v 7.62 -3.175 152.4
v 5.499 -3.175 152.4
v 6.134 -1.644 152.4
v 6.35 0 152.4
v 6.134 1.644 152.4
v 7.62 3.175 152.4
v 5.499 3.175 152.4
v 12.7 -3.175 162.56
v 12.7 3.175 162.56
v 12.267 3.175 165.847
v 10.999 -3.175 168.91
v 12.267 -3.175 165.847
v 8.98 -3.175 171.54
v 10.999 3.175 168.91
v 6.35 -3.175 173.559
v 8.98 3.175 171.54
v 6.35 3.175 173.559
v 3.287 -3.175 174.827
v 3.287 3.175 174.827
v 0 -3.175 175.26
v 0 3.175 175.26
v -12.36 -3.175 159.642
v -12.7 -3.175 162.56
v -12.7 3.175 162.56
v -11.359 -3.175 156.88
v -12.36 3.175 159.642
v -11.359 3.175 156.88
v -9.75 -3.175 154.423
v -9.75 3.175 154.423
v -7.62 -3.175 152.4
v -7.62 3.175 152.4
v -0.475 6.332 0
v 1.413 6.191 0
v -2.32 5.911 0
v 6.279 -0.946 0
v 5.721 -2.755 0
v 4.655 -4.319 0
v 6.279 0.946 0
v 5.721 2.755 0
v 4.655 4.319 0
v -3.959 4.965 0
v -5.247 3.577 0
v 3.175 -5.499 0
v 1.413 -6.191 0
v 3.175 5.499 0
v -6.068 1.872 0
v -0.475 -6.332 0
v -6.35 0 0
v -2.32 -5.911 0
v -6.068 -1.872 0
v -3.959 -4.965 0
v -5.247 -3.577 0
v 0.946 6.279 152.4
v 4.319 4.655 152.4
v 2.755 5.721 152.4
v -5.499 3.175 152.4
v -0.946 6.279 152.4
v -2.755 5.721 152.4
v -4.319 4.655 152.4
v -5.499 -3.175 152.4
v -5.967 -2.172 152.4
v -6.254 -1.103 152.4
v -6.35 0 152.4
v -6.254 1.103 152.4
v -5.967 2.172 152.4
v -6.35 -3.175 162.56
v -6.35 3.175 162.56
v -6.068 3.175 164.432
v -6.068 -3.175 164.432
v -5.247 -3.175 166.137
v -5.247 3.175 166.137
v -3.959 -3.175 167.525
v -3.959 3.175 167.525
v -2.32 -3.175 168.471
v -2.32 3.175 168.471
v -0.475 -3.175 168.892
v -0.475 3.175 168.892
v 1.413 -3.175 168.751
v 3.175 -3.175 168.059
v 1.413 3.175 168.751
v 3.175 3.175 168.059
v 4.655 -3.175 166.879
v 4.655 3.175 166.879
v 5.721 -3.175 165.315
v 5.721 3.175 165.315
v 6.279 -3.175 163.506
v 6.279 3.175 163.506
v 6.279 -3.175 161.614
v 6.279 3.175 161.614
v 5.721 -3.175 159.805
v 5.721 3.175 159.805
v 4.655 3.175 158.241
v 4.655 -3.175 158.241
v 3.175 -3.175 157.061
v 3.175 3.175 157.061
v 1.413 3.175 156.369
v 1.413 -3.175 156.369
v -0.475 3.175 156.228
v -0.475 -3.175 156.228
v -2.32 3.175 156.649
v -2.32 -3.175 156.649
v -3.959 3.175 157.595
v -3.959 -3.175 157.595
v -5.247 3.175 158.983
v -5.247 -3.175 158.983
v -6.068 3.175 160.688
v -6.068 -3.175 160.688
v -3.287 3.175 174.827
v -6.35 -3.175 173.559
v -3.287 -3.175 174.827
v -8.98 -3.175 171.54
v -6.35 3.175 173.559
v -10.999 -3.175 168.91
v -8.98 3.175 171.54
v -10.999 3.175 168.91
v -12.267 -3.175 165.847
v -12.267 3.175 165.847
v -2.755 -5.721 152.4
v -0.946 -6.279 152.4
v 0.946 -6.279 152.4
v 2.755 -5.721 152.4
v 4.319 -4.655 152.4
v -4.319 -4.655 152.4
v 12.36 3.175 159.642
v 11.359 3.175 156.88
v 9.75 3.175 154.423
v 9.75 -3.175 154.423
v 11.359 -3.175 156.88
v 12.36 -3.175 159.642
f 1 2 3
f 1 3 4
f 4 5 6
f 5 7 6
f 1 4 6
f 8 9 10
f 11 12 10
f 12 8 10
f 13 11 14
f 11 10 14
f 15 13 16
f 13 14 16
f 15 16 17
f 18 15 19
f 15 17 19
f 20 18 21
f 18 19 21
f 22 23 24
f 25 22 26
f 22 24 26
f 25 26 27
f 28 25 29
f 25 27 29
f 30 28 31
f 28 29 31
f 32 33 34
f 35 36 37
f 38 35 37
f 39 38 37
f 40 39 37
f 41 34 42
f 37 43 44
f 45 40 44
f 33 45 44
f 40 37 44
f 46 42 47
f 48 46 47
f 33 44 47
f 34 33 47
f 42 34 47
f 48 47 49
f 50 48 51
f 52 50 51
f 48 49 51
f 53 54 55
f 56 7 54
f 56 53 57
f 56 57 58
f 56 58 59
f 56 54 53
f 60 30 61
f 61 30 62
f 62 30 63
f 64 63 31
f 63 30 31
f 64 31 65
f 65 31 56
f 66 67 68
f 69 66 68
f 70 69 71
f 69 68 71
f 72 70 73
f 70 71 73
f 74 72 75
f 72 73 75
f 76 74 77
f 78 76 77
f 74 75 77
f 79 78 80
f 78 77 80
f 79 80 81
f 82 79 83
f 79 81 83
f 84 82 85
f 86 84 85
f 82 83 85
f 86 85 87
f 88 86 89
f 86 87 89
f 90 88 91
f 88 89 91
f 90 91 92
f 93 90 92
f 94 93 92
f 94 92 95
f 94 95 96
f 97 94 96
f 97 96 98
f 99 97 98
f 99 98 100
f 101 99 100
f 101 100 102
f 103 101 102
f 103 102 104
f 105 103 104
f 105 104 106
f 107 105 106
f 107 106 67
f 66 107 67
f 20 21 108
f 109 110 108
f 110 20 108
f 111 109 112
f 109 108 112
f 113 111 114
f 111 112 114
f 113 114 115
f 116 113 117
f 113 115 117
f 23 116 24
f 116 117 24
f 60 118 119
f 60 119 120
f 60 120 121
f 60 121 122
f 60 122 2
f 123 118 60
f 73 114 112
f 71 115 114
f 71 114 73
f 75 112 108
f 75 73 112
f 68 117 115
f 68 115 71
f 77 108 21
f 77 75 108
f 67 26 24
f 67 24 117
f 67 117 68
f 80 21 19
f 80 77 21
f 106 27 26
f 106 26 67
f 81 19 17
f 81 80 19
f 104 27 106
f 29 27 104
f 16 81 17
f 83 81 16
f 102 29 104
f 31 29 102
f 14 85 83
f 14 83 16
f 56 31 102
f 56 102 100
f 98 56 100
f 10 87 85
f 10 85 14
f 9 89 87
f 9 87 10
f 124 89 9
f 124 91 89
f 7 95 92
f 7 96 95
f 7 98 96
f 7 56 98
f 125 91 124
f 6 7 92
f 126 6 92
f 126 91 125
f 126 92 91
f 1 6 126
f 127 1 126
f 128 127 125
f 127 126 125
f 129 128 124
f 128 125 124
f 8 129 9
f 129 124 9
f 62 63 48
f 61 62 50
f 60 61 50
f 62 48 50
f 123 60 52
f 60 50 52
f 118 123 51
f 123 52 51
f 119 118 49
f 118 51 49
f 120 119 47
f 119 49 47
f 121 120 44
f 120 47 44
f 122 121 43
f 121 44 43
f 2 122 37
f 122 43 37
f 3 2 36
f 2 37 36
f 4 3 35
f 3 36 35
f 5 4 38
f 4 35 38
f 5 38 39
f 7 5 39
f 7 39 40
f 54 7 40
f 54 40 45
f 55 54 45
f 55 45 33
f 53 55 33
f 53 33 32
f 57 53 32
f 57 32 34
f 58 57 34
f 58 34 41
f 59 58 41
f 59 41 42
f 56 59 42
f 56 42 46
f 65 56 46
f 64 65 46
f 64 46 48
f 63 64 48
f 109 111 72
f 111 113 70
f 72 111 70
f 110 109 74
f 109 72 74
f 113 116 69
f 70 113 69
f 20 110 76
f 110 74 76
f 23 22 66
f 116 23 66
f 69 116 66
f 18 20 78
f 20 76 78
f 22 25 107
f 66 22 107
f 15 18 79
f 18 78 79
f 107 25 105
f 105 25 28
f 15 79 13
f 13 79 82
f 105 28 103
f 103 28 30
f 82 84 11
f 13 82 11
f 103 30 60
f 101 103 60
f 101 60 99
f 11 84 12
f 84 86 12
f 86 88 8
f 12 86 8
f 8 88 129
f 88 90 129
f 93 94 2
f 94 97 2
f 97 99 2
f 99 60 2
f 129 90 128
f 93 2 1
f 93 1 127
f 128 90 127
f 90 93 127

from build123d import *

# Parameters (mm, degrees)
SKETCH1_R           = 6.35
BOSS_EXTRUDE1_DEPTH = 152.4
SKETCH2_W           = 25.4
SKETCH2_H           = 6.35
BOSS_EXTRUDE2_DEPTH = 22.86
SKETCH3_R           = 6.35
CUT_EXTRUDE1_DEPTH  = 22.86


with BuildPart() as part:
    # Sketch1 → Boss-Extrude1 (new body)
    with BuildSketch(Plane.XY):
        Circle(SKETCH1_R)
    extrude(amount=BOSS_EXTRUDE1_DEPTH)

    # Sketch2 → Boss-Extrude2 (add)
    with BuildSketch(Plane.XY.offset(152.4)):
        Rectangle(SKETCH2_W, SKETCH2_H)
    extrude(amount=BOSS_EXTRUDE2_DEPTH)

    # Sketch3 → Cut-Extrude1 (cut)
    with BuildSketch(Plane(origin=(0, 3.175, 0), x_dir=(1, 0, 0), z_dir=(0, 1, 0))):
        with Locations((0, -162.56)):
            Circle(SKETCH3_R)
        with BuildLine():
            ThreePointArc((12.7, -162.56), (8.980256121, -171.540256121), (0, -175.26))
            Line((0, -175.26), (12.7, -175.26))
            Line((12.7, -175.26), (12.7, -162.56))
        make_face()
        with BuildLine():
            Line((-12.7, -175.26), (0, -175.26))
            ThreePointArc((0, -175.26), (-8.980256121, -171.540256121), (-12.7, -162.56))
            Line((-12.7, -162.56), (-12.7, -175.26))
        make_face()
        with BuildLine():
            ThreePointArc((7.62, -152.4), (11.359225326, -156.880387337), (12.7, -162.56))
            Line((12.7, -162.56), (12.7, -152.4))
            Line((12.7, -152.4), (7.62, -152.4))
        make_face()
        with BuildLine():
            Line((-12.7, -152.4), (-12.7, -162.56))
            ThreePointArc((-12.7, -162.56), (-11.359225326, -156.880387337), (-7.62, -152.4))
            Line((-7.62, -152.4), (-12.7, -152.4))
        make_face()
    extrude(amount=-CUT_EXTRUDE1_DEPTH, mode=Mode.SUBTRACT)


solid = part.part
